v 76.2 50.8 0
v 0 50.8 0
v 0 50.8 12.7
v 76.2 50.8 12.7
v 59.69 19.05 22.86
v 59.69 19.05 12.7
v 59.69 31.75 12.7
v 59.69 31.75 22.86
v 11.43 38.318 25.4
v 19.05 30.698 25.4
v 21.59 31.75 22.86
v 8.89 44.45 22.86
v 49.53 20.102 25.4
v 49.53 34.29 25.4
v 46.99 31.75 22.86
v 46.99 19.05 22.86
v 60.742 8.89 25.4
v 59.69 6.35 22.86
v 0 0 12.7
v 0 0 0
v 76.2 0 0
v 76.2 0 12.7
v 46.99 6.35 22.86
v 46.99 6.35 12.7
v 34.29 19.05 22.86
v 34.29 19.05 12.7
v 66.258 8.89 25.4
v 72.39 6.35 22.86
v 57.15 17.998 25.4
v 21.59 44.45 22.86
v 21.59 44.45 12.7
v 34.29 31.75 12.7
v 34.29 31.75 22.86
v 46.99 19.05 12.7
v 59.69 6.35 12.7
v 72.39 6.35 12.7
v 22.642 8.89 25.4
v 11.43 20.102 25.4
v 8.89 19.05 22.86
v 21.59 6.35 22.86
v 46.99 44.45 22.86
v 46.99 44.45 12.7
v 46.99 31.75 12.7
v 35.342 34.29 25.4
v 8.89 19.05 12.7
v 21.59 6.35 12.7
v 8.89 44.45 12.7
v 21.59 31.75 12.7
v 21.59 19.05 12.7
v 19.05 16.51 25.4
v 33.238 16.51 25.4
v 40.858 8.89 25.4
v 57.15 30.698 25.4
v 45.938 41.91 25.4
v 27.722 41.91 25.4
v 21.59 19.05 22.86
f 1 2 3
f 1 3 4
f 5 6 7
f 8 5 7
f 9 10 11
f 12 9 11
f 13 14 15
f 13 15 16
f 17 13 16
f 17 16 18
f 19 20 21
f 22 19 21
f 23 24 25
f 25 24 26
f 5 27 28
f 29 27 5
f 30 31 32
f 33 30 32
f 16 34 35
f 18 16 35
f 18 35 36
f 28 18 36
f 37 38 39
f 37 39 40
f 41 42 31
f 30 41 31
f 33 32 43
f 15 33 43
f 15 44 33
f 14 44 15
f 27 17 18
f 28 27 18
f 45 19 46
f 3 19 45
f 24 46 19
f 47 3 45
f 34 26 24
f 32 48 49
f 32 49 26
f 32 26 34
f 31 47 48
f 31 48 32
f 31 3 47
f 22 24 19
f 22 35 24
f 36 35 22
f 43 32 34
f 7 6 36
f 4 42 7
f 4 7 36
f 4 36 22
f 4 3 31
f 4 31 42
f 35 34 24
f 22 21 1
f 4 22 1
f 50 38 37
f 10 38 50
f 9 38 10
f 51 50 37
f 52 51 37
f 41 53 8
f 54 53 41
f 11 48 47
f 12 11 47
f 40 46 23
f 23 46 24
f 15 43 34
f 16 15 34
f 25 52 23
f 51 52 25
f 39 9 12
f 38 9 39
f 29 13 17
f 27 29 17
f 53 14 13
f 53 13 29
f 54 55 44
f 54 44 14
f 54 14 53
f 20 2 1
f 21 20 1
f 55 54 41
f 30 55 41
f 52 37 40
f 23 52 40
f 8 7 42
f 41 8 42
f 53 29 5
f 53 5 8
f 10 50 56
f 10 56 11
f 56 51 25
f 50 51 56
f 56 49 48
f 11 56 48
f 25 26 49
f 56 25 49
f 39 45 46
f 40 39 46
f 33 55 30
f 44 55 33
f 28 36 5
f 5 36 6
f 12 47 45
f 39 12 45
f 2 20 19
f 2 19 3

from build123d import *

# Parameters (mm, degrees)
F0_W     = 76.2
F0_H     = 50.8
F1_DEPTH = 25.4
F2_W     = 76.2
F2_H     = 50.8
F3_DEPTH = 12.7
F5_DEPTH = 12.7
F6_SIZE  = 2.54


with BuildPart() as f1:
    # F0 (on Top) → F1 (new body)
    with BuildSketch(Plane.XY):
        with Locations((38.1, 25.4)):
            Rectangle(F0_W, F0_H)
    extrude(amount=F1_DEPTH)

    # F2 (on face) → F3 (cut)
    with BuildSketch(Plane.XY.offset(25.4)):
        with Locations((38.1, 25.4)):
            Rectangle(F2_W, F2_H)
    extrude(amount=-F3_DEPTH, mode=Mode.SUBTRACT)

    # F4 (on face) → F5 (join)
    with BuildSketch(Plane.XY.offset(12.7)):
        Polygon((21.59, 31.75), (8.89, 44.45), (8.89, 31.75), (8.89, 19.05), (21.59, 6.35), (34.29, 6.35), (46.99, 6.35), (34.29, 19.05), (21.59, 19.05), align=None)
        Polygon((46.99, 19.05), (59.69, 6.35), (72.39, 6.35), (59.69, 19.05), (59.69, 31.75), (46.99, 44.45), (34.29, 44.45), (21.59, 44.45), (34.29, 31.75), (46.99, 31.75), align=None)
    extrude(amount=F5_DEPTH)

    # F6
    f6_edges = [f1.edges().sort_by_distance(p)[0] for p in [
        (15.24, 12.7, 25.4),
        (8.89, 31.75, 25.4),
        (15.24, 38.1, 25.4),
        (21.59, 25.4, 25.4),
        (27.94, 19.05, 25.4),
        (40.64, 12.7, 25.4),
        (34.29, 6.35, 25.4),
        (53.34, 12.7, 25.4),
        (66.04, 12.7, 25.4),
        (66.04, 6.35, 25.4),
        (46.99, 25.4, 25.4),
        (53.34, 38.1, 25.4),
        (27.94, 38.1, 25.4),
        (34.29, 44.45, 25.4),
        (40.64, 31.75, 25.4),
        (59.69, 25.4, 25.4),
    ]]
    chamfer(f6_edges, length=F6_SIZE)


solid = f1.part
